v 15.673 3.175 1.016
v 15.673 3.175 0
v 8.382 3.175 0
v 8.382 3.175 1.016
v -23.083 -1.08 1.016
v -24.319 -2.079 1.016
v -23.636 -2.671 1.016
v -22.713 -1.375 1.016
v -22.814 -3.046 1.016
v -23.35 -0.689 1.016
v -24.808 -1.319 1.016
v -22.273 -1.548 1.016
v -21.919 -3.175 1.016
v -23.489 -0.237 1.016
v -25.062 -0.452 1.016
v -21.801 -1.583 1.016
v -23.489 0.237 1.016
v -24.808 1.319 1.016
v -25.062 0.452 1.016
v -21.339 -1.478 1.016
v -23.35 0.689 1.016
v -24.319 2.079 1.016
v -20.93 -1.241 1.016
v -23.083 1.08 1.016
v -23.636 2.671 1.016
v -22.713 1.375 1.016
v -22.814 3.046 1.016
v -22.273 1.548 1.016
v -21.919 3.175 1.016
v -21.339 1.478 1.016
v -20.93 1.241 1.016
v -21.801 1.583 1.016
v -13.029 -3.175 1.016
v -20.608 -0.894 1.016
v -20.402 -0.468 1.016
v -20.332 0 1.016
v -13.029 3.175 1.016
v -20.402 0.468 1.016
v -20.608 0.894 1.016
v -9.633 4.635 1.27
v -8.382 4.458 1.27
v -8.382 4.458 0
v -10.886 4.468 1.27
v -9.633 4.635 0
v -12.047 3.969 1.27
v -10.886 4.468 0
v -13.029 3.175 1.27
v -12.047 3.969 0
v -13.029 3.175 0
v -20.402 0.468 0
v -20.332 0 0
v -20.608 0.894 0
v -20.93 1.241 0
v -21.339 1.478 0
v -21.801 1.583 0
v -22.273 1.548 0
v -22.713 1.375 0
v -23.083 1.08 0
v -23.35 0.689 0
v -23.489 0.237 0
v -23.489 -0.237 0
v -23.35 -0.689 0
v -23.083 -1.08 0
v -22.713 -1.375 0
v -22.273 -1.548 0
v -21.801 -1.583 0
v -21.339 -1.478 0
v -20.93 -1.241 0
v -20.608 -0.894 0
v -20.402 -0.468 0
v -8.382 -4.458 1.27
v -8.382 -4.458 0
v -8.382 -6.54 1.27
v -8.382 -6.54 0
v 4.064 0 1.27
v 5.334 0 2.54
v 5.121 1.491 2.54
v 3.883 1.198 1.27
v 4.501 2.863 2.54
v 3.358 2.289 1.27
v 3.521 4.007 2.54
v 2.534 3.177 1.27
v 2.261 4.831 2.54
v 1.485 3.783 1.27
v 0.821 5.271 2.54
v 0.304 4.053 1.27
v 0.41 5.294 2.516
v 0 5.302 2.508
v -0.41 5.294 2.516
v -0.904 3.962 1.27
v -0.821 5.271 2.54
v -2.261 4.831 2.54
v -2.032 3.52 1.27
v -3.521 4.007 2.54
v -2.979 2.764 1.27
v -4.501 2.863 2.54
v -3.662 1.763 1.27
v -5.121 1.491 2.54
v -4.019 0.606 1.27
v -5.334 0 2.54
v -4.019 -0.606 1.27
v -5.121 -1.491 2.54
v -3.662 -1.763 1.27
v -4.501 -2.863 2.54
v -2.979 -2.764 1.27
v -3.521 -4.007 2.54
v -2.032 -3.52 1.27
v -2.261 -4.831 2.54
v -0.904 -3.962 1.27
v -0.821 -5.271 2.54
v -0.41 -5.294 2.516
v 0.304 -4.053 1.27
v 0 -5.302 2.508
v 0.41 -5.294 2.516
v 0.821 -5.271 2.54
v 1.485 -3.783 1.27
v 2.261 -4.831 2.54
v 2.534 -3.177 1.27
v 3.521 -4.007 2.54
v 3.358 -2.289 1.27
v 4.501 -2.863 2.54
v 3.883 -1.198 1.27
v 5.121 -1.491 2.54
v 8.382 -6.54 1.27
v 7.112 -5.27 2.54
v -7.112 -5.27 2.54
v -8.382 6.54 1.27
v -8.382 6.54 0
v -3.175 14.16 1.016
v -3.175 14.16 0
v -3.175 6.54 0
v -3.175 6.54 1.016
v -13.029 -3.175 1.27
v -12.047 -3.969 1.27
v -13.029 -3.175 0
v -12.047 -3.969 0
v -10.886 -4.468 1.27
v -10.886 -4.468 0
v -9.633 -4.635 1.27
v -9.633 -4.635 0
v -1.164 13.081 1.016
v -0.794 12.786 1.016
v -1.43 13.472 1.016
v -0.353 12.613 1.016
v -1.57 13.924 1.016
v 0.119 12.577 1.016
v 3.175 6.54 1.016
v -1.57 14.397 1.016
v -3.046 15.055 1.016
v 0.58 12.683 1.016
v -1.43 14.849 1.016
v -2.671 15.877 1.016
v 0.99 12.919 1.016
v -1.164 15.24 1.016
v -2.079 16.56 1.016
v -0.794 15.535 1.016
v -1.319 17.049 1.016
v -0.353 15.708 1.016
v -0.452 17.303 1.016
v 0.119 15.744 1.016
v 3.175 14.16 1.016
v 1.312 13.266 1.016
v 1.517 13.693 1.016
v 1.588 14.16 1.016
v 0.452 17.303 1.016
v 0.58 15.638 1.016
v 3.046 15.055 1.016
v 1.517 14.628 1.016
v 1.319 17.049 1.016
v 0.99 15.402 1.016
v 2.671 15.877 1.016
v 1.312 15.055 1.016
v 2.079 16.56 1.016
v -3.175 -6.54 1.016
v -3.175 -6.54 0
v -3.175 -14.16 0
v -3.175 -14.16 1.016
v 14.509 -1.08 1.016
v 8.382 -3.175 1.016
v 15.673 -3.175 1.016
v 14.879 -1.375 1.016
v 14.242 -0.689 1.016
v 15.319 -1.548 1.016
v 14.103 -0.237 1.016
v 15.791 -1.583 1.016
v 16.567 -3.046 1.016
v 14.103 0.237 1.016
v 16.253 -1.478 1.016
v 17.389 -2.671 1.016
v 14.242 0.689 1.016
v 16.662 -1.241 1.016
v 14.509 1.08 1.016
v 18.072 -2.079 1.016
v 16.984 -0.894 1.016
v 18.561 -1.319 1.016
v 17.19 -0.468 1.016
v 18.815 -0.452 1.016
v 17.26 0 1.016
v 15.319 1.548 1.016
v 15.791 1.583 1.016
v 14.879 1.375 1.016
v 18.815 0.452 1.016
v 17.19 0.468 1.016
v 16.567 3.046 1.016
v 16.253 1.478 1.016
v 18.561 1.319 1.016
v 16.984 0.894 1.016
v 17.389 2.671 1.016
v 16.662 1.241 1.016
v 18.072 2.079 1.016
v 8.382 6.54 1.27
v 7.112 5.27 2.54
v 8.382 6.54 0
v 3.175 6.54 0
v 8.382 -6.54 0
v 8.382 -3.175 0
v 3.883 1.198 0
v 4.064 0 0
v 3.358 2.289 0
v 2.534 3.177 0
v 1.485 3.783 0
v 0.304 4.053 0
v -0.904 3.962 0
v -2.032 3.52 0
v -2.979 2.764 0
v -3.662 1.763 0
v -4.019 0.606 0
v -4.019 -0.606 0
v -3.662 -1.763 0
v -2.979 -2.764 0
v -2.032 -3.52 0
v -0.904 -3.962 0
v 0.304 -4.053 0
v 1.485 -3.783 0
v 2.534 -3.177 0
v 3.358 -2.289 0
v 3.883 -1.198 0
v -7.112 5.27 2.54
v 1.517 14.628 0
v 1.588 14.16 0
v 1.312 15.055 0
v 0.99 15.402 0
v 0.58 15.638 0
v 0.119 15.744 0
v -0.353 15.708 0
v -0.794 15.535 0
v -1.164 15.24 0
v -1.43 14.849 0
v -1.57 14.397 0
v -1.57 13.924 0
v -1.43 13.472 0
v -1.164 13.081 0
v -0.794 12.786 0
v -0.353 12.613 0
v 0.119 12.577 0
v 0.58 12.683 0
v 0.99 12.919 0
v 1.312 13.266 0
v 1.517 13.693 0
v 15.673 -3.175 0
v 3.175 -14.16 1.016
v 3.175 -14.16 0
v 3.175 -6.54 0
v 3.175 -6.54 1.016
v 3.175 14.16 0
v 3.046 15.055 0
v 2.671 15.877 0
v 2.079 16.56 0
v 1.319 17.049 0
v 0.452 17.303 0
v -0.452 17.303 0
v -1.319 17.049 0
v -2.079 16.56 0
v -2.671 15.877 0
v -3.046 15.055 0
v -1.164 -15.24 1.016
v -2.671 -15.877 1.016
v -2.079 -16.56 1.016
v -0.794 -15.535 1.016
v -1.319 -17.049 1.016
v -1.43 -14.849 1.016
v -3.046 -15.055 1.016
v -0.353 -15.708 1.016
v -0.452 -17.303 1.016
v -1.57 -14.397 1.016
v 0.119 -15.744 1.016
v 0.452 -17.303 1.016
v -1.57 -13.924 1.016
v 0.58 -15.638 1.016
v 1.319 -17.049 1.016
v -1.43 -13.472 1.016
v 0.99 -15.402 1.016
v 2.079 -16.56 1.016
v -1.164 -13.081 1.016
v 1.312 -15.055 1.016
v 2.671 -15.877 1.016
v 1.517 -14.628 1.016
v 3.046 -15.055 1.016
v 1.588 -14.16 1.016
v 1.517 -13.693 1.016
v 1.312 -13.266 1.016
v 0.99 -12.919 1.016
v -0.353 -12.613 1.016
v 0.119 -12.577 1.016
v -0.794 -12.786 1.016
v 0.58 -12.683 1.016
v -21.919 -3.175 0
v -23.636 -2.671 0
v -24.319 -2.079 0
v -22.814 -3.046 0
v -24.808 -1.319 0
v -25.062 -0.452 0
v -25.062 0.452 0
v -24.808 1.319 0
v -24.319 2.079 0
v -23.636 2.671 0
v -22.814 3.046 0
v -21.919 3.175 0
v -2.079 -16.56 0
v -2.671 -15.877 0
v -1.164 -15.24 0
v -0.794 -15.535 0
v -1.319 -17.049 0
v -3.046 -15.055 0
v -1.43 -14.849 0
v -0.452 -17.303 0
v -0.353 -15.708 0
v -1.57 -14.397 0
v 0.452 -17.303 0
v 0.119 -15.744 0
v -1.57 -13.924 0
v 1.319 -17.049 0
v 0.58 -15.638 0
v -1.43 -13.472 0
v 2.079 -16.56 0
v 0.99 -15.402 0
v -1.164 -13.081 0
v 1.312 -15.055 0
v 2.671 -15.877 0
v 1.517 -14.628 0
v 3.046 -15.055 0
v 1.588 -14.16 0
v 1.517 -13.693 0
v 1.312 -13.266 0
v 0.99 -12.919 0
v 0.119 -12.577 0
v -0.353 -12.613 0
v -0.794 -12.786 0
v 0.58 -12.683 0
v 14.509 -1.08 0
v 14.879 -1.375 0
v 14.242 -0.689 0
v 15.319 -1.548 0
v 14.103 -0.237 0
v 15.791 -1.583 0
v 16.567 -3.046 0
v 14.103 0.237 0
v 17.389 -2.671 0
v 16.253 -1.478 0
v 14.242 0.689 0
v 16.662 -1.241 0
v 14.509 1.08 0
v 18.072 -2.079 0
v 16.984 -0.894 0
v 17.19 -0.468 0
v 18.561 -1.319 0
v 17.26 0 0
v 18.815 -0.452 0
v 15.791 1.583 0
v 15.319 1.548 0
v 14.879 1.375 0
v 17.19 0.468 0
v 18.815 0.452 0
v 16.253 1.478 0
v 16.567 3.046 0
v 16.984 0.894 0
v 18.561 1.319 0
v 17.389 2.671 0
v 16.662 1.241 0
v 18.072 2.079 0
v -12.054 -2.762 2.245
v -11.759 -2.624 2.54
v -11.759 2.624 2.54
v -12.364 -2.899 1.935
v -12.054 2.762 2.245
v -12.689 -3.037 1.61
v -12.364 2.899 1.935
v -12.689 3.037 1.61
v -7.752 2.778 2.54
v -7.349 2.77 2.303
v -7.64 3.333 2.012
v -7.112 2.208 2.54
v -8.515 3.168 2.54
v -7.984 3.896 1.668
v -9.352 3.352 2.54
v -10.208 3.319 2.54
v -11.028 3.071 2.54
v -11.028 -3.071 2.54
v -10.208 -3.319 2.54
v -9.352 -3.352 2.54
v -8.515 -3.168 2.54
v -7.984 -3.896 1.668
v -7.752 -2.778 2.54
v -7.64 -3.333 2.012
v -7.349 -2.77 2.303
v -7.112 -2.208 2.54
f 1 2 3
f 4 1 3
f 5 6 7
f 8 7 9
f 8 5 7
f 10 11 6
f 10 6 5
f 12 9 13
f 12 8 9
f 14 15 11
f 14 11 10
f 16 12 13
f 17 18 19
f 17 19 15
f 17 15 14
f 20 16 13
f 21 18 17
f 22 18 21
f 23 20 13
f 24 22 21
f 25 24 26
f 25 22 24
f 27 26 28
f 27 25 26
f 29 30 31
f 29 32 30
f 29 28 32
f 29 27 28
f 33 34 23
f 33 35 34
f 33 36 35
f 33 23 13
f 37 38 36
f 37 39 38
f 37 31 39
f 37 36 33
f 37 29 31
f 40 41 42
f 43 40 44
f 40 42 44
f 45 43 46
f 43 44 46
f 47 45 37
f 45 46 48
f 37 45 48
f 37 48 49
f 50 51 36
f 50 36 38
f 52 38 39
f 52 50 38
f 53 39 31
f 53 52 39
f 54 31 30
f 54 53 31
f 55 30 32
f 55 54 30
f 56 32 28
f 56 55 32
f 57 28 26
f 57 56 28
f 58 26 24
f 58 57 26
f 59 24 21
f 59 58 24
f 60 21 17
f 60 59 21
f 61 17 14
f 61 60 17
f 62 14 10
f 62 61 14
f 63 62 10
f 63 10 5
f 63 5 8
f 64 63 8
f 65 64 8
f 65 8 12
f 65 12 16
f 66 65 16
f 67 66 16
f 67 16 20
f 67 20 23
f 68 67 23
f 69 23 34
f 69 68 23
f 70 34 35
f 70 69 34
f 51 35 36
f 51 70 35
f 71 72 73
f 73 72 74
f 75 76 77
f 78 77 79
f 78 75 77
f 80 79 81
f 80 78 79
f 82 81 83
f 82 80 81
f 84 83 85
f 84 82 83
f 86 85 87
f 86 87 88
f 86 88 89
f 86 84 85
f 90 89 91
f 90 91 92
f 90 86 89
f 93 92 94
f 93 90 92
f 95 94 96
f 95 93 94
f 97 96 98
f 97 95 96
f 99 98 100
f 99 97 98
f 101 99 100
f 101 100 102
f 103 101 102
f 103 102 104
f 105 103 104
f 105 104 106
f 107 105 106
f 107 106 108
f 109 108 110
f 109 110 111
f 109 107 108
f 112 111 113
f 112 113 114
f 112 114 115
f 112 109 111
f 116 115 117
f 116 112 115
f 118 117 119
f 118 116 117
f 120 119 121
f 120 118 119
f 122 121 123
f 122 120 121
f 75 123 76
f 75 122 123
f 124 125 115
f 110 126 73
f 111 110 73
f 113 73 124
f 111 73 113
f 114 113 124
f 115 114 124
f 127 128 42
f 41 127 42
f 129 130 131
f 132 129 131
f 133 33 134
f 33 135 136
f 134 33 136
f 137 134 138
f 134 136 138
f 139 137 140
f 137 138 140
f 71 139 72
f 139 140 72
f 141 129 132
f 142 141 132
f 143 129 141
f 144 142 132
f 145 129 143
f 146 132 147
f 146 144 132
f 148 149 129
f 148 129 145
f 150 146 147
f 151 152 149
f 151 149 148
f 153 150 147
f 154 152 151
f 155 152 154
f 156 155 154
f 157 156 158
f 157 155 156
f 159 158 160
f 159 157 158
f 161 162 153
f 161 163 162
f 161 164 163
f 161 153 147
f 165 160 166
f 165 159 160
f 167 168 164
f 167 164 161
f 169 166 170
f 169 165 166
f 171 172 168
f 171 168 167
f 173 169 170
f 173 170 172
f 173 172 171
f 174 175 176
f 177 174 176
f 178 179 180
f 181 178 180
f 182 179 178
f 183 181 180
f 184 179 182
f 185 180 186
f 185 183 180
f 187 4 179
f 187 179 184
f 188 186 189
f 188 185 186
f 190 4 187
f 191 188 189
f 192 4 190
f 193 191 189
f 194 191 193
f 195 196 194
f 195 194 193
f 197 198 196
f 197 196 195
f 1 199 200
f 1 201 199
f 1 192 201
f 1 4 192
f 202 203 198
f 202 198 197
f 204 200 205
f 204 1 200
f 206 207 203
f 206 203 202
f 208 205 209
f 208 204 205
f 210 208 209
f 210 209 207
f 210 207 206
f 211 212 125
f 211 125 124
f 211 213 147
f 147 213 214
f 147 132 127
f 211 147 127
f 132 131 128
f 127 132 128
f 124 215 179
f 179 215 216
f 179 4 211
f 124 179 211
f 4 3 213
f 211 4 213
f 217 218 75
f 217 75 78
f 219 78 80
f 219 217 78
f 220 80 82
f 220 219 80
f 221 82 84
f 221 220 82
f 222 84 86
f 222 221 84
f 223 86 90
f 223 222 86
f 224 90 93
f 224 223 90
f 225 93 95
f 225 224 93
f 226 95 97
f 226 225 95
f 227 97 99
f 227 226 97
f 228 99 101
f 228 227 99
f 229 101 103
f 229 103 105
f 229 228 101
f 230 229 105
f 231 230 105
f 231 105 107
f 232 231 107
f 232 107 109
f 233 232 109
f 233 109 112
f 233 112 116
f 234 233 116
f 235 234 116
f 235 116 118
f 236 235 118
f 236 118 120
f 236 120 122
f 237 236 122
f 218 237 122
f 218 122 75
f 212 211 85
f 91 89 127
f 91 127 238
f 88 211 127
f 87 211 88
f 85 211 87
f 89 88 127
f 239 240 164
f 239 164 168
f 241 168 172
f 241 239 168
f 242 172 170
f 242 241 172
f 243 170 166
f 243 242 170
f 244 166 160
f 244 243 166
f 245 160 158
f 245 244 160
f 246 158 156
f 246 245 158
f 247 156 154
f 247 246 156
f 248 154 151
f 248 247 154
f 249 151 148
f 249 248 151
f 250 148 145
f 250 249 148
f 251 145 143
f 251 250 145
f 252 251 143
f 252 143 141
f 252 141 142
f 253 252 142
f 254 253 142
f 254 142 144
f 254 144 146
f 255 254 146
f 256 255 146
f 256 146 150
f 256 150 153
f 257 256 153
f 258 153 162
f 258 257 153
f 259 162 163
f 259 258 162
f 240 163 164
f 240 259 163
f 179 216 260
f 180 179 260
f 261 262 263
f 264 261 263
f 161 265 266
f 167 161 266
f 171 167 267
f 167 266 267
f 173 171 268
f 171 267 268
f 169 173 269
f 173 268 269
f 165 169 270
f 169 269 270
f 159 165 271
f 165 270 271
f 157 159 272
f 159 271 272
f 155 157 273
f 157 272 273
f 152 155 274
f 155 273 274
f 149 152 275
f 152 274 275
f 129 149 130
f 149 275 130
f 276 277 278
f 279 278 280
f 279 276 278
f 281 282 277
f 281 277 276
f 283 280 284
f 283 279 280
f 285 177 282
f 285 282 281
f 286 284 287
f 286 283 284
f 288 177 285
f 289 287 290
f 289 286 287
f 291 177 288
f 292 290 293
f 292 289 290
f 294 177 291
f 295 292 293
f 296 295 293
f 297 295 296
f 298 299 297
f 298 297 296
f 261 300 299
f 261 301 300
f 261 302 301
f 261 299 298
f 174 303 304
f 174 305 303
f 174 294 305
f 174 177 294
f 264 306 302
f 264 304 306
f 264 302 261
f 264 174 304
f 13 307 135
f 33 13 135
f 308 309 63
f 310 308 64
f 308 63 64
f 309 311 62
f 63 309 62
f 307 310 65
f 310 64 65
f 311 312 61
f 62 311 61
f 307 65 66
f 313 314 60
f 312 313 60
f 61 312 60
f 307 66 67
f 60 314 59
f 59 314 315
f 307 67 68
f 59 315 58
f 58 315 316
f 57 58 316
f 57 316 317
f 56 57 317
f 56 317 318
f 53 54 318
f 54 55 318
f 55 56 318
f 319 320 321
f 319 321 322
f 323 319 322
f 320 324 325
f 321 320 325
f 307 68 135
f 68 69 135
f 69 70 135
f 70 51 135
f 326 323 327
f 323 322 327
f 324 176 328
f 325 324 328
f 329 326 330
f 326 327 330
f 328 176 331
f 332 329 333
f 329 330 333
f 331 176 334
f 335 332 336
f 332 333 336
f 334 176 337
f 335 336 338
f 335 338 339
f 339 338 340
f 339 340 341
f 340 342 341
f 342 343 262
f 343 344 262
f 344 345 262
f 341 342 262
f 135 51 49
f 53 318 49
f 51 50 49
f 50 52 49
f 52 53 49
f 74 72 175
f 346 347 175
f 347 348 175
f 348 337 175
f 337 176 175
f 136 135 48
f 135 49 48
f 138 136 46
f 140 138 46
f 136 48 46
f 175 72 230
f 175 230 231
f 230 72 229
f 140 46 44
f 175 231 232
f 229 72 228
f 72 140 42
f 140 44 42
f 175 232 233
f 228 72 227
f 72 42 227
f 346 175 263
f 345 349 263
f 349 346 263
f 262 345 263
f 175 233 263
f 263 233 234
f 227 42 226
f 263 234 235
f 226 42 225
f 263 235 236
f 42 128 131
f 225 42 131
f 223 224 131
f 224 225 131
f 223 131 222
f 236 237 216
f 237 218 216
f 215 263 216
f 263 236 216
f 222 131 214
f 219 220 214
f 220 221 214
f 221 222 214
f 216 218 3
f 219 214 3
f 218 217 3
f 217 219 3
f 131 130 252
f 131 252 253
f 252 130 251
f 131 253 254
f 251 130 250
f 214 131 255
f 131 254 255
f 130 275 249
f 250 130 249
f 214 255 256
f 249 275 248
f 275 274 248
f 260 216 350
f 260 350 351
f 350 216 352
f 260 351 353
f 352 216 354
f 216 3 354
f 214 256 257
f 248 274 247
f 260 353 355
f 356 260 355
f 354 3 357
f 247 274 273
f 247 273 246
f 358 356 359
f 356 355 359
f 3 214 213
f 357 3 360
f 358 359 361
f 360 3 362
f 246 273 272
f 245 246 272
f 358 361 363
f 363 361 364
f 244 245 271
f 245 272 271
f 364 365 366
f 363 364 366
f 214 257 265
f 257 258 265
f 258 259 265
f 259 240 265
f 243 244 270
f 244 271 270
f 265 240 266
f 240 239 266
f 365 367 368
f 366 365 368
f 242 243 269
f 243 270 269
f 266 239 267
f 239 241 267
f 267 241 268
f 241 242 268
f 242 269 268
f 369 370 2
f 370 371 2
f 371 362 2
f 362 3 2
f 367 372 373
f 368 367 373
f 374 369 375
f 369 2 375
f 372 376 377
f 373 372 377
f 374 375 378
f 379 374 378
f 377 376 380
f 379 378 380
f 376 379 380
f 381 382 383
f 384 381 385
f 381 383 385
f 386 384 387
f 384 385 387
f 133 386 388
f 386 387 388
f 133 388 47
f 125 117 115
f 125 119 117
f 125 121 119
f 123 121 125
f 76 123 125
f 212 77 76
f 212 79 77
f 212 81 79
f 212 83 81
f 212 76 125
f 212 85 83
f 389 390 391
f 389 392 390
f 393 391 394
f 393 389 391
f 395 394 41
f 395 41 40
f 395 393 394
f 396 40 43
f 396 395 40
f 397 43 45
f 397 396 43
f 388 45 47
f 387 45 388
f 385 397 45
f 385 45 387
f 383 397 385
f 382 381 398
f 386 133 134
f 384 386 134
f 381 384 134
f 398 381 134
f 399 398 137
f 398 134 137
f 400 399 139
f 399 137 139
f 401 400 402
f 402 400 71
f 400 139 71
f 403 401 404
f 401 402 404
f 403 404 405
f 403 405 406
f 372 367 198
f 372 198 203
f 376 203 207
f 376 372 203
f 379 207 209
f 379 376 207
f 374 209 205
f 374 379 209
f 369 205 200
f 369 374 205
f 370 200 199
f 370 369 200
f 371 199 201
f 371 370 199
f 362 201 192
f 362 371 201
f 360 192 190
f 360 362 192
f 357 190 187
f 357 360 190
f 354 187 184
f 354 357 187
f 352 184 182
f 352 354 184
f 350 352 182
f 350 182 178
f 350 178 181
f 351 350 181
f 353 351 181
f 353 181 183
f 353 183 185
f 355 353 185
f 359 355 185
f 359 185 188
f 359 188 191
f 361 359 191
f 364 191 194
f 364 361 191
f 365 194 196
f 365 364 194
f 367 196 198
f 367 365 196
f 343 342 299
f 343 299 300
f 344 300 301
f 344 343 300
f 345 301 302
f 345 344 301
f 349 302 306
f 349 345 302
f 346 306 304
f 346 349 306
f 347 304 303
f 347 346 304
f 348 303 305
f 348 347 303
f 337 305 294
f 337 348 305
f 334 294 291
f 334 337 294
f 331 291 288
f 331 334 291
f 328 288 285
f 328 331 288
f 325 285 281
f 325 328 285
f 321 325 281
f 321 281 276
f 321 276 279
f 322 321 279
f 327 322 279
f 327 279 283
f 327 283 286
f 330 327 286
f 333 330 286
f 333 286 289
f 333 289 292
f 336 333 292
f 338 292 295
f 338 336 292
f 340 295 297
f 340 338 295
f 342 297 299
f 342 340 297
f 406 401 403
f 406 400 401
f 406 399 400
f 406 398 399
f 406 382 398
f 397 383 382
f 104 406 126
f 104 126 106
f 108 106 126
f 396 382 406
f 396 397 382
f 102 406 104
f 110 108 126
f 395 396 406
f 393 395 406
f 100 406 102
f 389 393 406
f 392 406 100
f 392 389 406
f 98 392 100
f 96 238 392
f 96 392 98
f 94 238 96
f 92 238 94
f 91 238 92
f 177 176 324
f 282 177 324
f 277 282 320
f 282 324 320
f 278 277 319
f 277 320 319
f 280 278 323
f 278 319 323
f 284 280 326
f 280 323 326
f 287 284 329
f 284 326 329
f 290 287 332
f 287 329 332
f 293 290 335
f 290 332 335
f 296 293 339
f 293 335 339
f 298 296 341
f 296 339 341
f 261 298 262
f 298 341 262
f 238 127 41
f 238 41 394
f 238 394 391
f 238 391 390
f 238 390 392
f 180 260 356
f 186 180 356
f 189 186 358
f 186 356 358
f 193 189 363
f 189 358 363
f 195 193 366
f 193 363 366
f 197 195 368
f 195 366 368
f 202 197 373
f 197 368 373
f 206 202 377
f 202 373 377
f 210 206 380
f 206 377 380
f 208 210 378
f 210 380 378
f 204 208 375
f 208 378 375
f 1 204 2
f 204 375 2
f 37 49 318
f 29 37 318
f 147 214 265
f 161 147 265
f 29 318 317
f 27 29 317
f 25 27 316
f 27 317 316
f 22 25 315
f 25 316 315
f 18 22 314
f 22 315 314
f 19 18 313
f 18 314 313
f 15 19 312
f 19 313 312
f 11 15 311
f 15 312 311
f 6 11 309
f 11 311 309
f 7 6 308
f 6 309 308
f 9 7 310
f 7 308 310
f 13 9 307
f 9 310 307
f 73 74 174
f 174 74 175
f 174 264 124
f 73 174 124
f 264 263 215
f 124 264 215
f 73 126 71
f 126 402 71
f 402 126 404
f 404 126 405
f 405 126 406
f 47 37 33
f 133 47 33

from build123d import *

# Parameters (mm, degrees)
F0_R         = 4.064
F1_DEPTH     = 2.54
F0_R_2       = 1.5875
F2_DEPTH     = 1.016
F3_T1_DEPTH  = 23.2960747894
F3_T3_DEPTH  = 19.6130747894
F3_T5_DEPTH  = 12.8820747894
F3_T10_DEPTH = 8.6144406225
F3_S11_R     = 4.6355
F3_T12_DEPTH = 6
F3_T16_ANGLE = 143.4241535748
F3_T21_ANGLE = 143.4241535748
F3_T26_DEPTH = 8.6144406225
F3_S27_R     = 4.6355
F3_T28_DEPTH = 6
F3_T35_ANGLE = 143.4241535748
F3_T39_DEPTH = 8.6144406225
F3_S40_R     = 4.6355
F3_T41_DEPTH = 6
F3_T47_DEPTH = 8.6144406225
F3_S48_R     = 4.6355
F3_T49_DEPTH = 6
F3_T52_ANGLE = 143.4241535748


# Not quite as in the source:
# - a fillet or chamfer that OpenCascade refuses, or shapes differently, is made with other operations: its cross-section is extruded or revolved along the edge and cut away or added
# - a feature names something its author has since deleted; it is built from what else it names


with BuildPart() as f1:
    # F0 (on Top) → F1 (new body)
    with BuildSketch(Plane.XY):
        Polygon((-8.382, 6.5405), (-8.382, 4.4581341669), (-8.382, -4.4581341669), (-8.382, -6.5405), (-3.175, -6.5405), (3.175, -6.5405), (8.382, -6.5405), (8.382, -3.175), (8.382, 3.175), (8.382, 6.5405), (3.175, 6.5405), (-3.175, 6.5405), align=None)
        Circle(F0_R, mode=Mode.SUBTRACT)
        with BuildLine():
            Line((-8.382, -4.4581341669), (-8.382, 4.4581341669))
            ThreePointArc((-8.382, 4.4581341669), (-10.8856754478, 4.4683224077), (-13.0294598813, 3.175))
            Line((-13.0294598813, 3.175), (-13.0294598813, -3.175))
            ThreePointArc((-13.0294598813, -3.175), (-10.8856754478, -4.4683224077), (-8.382, -4.4581341669))
        make_face()
    extrude(amount=F1_DEPTH)

    # F0 (on Top) → F2 (join)
    with BuildSketch(Plane.XY):
        with BuildLine():
            Line((-13.0294598813, -3.175), (-13.0294598813, 3.175))
            Line((-13.0294598813, 3.175), (-21.9194598813, 3.175))
            ThreePointArc((-21.9194598813, 3.175), (-25.0944598813, 0), (-21.9194598813, -3.175))
            Line((-21.9194598813, -3.175), (-13.0294598813, -3.175))
        make_face()
        with Locations((-21.9194598813, 0)):
            Circle(F0_R_2, mode=Mode.SUBTRACT)
        with BuildLine():
            Line((3.175, -6.5405), (-3.175, -6.5405))
            Line((-3.175, -6.5405), (-3.175, -14.1605))
            ThreePointArc((-3.175, -14.1605), (0, -17.3355), (3.175, -14.1605))
            Line((3.175, -14.1605), (3.175, -6.5405))
        make_face()
        with Locations((0, -14.1605)):
            Circle(F0_R_2, mode=Mode.SUBTRACT)
        with BuildLine():
            Line((-3.175, 14.1605), (-3.175, 6.5405))
            Line((-3.175, 6.5405), (3.175, 6.5405))
            Line((3.175, 6.5405), (3.175, 14.1605))
            ThreePointArc((3.175, 14.1605), (0, 17.3355), (-3.175, 14.1605))
        make_face()
        with Locations((0, 14.1605)):
            Circle(F0_R_2, mode=Mode.SUBTRACT)
        with BuildLine():
            Line((15.6725401187, 3.175), (8.382, 3.175))
            Line((8.382, 3.175), (8.382, -3.175))
            Line((8.382, -3.175), (15.6725401187, -3.175))
            ThreePointArc((15.6725401187, -3.175), (18.8475401187, 0), (15.6725401187, 3.175))
        make_face()
        with Locations((15.6725401187, 0)):
            Circle(F0_R_2, mode=Mode.SUBTRACT)
    extrude(amount=F2_DEPTH)

    # F3: chamfer of 1.27 on 9 edges, made by hand

    # F3_s2 → F3_t1 (cut)
    with BuildSketch(Plane.YZ.offset(-11.6480373947)):
        Polygon((-5.2705, 2.54), (-6.5405, 1.27), (-6.5405, 2.54), align=None)
        Polygon((6.5405, 1.27), (5.2705, 2.54), (6.5405, 2.54), align=None)
    extrude(amount=F3_T1_DEPTH, mode=Mode.SUBTRACT)

    # F3_s4 → F3_t3 (cut)
    with BuildSketch(Plane.XZ.offset(-9.8065373947)):
        Polygon((7.112, 2.54), (8.382, 1.27), (8.382, 2.54), align=None)
    extrude(amount=F3_T3_DEPTH, mode=Mode.SUBTRACT)

    # F3_s6 → F3_t5 (cut)
    with BuildSketch(Plane.XZ.offset(-6.4410373947)):
        Polygon((-11.7594598813, 2.54), (-13.0294598813, 1.27), (-13.0294598813, 2.54), align=None)
    extrude(amount=F3_T5_DEPTH, mode=Mode.SUBTRACT)


with BuildPart() as f3_tool8:
    # F3_s9 → F3_t10 (new body)
    with BuildSketch(Plane.XZ.offset(1.1920967722)):
        Polygon((-7.112, 2.54), (-8.382, 1.27), (-8.382, 2.54), align=None)
    extrude(amount=F3_T10_DEPTH)

    # F3_s11 → F3_t12 (cut, symmetric)
    with BuildSketch(Plane.XY.offset(1.9)):
        with Locations((-9.652, 0)):
            Circle(F3_S11_R)
    extrude(amount=F3_T12_DEPTH, both=True, mode=Mode.SUBTRACT)


with BuildPart() as f1_1:
    add(f1.part)

    # F3_t7: cut F3_tool8
    add(f3_tool8.part, mode=Mode.SUBTRACT)


with BuildPart() as f3_tool14:
    # F3_s15 → F3_t16 (revolve)
    with BuildSketch(Plane(origin=(-0.0239192805, 0.47989245, 0), x_dir=(0, 0, 1), z_dir=(-0.0497812044, 0.9987601472, 0))):
        Polygon((2.54, -13.005532941), (1.27, -14.275532941), (2.54, -14.275532941), align=None)
    revolve(axis=Axis((-9.652, 0, 2.54), (0, 0, 1)), revolution_arc=F3_T16_ANGLE)

    split(bisect_by=Plane.YZ.offset(-8.382), keep=Keep.BOTTOM)


with BuildPart() as f1_2:
    add(f1_1.part)

    # F3_t13: cut F3_tool14
    add(f3_tool14.part, mode=Mode.SUBTRACT)


with BuildPart() as f3_tool19:
    # F3_s20 → F3_t21 (revolve)
    with BuildSketch(Plane(origin=(-2.9748772597, 4.4568621922, 0), x_dir=(0, 0, 1), z_dir=(0.5551698459, -0.831737003, 0))):
        Polygon((1.27, 3.3924255533), (2.54, 4.6624255533), (2.54, 3.3924255533), align=None)
    revolve(axis=Axis((-9.652, 0, 2.54), (0, 0, 1)), revolution_arc=F3_T21_ANGLE)

    split(bisect_by=Plane.YZ.offset(-8.382), keep=Keep.BOTTOM)


with BuildPart() as f1_3:
    add(f1_2.part)

    # F3_t18: cut F3_tool19
    add(f3_tool19.part, mode=Mode.SUBTRACT)


with BuildPart() as f3_tool24:
    # F3_s25 → F3_t26 (new body)
    with BuildSketch(Plane.XZ.offset(-9.8065373947)):
        Polygon((-8.382, 1.27), (-7.112, 2.54), (-8.382, 2.54), align=None)
    extrude(amount=F3_T26_DEPTH)

    # F3_s27 → F3_t28 (cut, symmetric)
    with BuildSketch(Plane.XY.offset(1.9)):
        with Locations((-9.652, 0)):
            Circle(F3_S27_R)
    extrude(amount=F3_T28_DEPTH, both=True, mode=Mode.SUBTRACT)


with BuildPart() as f1_4:
    add(f1_3.part)

    # F3_t23: cut F3_tool24
    add(f3_tool24.part, mode=Mode.SUBTRACT)

    # F3_s29 → F3_t30 (revolve, cut)
    with BuildSketch(Plane.XZ):
        Polygon((5.334, 2.54), (4.064, 1.27), (4.064, 2.54), align=None)
    revolve(axis=Axis((0, 0, 2.54), (0, 0, 1)), mode=Mode.SUBTRACT)


with BuildPart() as f3_tool33:
    # F3_s34 → F3_t35 (revolve)
    with BuildSketch(Plane(origin=(-0.0239192805, 0.47989245, 0), x_dir=(0, 0, 1), z_dir=(-0.0497812044, 0.9987601472, 0))):
        Polygon((2.54, -13.005532941), (1.27, -14.275532941), (2.54, -14.275532941), align=None)
    revolve(axis=Axis((-9.652, 0, 2.54), (0, 0, 1)), revolution_arc=F3_T35_ANGLE)

    split(bisect_by=Plane.YZ.offset(-8.382), keep=Keep.TOP)


with BuildPart() as f3_tool37:
    # F3_s38 → F3_t39 (new body)
    with BuildSketch(Plane.XZ.offset(1.1920967722)):
        Polygon((-7.112, 2.54), (-8.382, 1.27), (-8.382, 2.54), align=None)
    extrude(amount=F3_T39_DEPTH)

    # F3_s40 → F3_t41 (intersect, symmetric)
    with BuildSketch(Plane.XY.offset(1.9)):
        with Locations((-9.652, 0)):
            Circle(F3_S40_R)
    extrude(amount=F3_T41_DEPTH, both=True, mode=Mode.INTERSECT)


with BuildPart() as f3_tool33_1:
    add(f3_tool33.part)

    # F3_t42: intersect F3_tool37
    add(f3_tool37.part, mode=Mode.INTERSECT)


with BuildPart() as f1_5:
    add(f1_4.part)

    # F3_t31: cut F3_tool33
    add(f3_tool33_1.part, mode=Mode.SUBTRACT)


with BuildPart() as f3_tool45:
    # F3_s46 → F3_t47 (new body)
    with BuildSketch(Plane.XZ.offset(-9.8065373947)):
        Polygon((-8.382, 1.27), (-7.112, 2.54), (-8.382, 2.54), align=None)
    extrude(amount=F3_T47_DEPTH)

    # F3_s48 → F3_t49 (intersect, symmetric)
    with BuildSketch(Plane.XY.offset(1.9)):
        with Locations((-9.652, 0)):
            Circle(F3_S48_R)
    extrude(amount=F3_T49_DEPTH, both=True, mode=Mode.INTERSECT)


with BuildPart() as f3_tool50:
    # F3_s51 → F3_t52 (revolve)
    with BuildSketch(Plane(origin=(-2.9748772597, 4.4568621922, 0), x_dir=(0, 0, 1), z_dir=(0.5551698459, -0.831737003, 0))):
        Polygon((1.27, 3.3924255533), (2.54, 4.6624255533), (2.54, 3.3924255533), align=None)
    revolve(axis=Axis((-9.652, 0, 2.54), (0, 0, 1)), revolution_arc=F3_T52_ANGLE)

    split(bisect_by=Plane.YZ.offset(-8.382), keep=Keep.TOP)


with BuildPart() as f3_tool45_1:
    add(f3_tool45.part)

    # F3_t54: intersect F3_tool50
    add(f3_tool50.part, mode=Mode.INTERSECT)


with BuildPart() as f1_6:
    add(f1_5.part)

    # F3_t43: cut F3_tool45
    add(f3_tool45_1.part, mode=Mode.SUBTRACT)


solid = f1_6.part
